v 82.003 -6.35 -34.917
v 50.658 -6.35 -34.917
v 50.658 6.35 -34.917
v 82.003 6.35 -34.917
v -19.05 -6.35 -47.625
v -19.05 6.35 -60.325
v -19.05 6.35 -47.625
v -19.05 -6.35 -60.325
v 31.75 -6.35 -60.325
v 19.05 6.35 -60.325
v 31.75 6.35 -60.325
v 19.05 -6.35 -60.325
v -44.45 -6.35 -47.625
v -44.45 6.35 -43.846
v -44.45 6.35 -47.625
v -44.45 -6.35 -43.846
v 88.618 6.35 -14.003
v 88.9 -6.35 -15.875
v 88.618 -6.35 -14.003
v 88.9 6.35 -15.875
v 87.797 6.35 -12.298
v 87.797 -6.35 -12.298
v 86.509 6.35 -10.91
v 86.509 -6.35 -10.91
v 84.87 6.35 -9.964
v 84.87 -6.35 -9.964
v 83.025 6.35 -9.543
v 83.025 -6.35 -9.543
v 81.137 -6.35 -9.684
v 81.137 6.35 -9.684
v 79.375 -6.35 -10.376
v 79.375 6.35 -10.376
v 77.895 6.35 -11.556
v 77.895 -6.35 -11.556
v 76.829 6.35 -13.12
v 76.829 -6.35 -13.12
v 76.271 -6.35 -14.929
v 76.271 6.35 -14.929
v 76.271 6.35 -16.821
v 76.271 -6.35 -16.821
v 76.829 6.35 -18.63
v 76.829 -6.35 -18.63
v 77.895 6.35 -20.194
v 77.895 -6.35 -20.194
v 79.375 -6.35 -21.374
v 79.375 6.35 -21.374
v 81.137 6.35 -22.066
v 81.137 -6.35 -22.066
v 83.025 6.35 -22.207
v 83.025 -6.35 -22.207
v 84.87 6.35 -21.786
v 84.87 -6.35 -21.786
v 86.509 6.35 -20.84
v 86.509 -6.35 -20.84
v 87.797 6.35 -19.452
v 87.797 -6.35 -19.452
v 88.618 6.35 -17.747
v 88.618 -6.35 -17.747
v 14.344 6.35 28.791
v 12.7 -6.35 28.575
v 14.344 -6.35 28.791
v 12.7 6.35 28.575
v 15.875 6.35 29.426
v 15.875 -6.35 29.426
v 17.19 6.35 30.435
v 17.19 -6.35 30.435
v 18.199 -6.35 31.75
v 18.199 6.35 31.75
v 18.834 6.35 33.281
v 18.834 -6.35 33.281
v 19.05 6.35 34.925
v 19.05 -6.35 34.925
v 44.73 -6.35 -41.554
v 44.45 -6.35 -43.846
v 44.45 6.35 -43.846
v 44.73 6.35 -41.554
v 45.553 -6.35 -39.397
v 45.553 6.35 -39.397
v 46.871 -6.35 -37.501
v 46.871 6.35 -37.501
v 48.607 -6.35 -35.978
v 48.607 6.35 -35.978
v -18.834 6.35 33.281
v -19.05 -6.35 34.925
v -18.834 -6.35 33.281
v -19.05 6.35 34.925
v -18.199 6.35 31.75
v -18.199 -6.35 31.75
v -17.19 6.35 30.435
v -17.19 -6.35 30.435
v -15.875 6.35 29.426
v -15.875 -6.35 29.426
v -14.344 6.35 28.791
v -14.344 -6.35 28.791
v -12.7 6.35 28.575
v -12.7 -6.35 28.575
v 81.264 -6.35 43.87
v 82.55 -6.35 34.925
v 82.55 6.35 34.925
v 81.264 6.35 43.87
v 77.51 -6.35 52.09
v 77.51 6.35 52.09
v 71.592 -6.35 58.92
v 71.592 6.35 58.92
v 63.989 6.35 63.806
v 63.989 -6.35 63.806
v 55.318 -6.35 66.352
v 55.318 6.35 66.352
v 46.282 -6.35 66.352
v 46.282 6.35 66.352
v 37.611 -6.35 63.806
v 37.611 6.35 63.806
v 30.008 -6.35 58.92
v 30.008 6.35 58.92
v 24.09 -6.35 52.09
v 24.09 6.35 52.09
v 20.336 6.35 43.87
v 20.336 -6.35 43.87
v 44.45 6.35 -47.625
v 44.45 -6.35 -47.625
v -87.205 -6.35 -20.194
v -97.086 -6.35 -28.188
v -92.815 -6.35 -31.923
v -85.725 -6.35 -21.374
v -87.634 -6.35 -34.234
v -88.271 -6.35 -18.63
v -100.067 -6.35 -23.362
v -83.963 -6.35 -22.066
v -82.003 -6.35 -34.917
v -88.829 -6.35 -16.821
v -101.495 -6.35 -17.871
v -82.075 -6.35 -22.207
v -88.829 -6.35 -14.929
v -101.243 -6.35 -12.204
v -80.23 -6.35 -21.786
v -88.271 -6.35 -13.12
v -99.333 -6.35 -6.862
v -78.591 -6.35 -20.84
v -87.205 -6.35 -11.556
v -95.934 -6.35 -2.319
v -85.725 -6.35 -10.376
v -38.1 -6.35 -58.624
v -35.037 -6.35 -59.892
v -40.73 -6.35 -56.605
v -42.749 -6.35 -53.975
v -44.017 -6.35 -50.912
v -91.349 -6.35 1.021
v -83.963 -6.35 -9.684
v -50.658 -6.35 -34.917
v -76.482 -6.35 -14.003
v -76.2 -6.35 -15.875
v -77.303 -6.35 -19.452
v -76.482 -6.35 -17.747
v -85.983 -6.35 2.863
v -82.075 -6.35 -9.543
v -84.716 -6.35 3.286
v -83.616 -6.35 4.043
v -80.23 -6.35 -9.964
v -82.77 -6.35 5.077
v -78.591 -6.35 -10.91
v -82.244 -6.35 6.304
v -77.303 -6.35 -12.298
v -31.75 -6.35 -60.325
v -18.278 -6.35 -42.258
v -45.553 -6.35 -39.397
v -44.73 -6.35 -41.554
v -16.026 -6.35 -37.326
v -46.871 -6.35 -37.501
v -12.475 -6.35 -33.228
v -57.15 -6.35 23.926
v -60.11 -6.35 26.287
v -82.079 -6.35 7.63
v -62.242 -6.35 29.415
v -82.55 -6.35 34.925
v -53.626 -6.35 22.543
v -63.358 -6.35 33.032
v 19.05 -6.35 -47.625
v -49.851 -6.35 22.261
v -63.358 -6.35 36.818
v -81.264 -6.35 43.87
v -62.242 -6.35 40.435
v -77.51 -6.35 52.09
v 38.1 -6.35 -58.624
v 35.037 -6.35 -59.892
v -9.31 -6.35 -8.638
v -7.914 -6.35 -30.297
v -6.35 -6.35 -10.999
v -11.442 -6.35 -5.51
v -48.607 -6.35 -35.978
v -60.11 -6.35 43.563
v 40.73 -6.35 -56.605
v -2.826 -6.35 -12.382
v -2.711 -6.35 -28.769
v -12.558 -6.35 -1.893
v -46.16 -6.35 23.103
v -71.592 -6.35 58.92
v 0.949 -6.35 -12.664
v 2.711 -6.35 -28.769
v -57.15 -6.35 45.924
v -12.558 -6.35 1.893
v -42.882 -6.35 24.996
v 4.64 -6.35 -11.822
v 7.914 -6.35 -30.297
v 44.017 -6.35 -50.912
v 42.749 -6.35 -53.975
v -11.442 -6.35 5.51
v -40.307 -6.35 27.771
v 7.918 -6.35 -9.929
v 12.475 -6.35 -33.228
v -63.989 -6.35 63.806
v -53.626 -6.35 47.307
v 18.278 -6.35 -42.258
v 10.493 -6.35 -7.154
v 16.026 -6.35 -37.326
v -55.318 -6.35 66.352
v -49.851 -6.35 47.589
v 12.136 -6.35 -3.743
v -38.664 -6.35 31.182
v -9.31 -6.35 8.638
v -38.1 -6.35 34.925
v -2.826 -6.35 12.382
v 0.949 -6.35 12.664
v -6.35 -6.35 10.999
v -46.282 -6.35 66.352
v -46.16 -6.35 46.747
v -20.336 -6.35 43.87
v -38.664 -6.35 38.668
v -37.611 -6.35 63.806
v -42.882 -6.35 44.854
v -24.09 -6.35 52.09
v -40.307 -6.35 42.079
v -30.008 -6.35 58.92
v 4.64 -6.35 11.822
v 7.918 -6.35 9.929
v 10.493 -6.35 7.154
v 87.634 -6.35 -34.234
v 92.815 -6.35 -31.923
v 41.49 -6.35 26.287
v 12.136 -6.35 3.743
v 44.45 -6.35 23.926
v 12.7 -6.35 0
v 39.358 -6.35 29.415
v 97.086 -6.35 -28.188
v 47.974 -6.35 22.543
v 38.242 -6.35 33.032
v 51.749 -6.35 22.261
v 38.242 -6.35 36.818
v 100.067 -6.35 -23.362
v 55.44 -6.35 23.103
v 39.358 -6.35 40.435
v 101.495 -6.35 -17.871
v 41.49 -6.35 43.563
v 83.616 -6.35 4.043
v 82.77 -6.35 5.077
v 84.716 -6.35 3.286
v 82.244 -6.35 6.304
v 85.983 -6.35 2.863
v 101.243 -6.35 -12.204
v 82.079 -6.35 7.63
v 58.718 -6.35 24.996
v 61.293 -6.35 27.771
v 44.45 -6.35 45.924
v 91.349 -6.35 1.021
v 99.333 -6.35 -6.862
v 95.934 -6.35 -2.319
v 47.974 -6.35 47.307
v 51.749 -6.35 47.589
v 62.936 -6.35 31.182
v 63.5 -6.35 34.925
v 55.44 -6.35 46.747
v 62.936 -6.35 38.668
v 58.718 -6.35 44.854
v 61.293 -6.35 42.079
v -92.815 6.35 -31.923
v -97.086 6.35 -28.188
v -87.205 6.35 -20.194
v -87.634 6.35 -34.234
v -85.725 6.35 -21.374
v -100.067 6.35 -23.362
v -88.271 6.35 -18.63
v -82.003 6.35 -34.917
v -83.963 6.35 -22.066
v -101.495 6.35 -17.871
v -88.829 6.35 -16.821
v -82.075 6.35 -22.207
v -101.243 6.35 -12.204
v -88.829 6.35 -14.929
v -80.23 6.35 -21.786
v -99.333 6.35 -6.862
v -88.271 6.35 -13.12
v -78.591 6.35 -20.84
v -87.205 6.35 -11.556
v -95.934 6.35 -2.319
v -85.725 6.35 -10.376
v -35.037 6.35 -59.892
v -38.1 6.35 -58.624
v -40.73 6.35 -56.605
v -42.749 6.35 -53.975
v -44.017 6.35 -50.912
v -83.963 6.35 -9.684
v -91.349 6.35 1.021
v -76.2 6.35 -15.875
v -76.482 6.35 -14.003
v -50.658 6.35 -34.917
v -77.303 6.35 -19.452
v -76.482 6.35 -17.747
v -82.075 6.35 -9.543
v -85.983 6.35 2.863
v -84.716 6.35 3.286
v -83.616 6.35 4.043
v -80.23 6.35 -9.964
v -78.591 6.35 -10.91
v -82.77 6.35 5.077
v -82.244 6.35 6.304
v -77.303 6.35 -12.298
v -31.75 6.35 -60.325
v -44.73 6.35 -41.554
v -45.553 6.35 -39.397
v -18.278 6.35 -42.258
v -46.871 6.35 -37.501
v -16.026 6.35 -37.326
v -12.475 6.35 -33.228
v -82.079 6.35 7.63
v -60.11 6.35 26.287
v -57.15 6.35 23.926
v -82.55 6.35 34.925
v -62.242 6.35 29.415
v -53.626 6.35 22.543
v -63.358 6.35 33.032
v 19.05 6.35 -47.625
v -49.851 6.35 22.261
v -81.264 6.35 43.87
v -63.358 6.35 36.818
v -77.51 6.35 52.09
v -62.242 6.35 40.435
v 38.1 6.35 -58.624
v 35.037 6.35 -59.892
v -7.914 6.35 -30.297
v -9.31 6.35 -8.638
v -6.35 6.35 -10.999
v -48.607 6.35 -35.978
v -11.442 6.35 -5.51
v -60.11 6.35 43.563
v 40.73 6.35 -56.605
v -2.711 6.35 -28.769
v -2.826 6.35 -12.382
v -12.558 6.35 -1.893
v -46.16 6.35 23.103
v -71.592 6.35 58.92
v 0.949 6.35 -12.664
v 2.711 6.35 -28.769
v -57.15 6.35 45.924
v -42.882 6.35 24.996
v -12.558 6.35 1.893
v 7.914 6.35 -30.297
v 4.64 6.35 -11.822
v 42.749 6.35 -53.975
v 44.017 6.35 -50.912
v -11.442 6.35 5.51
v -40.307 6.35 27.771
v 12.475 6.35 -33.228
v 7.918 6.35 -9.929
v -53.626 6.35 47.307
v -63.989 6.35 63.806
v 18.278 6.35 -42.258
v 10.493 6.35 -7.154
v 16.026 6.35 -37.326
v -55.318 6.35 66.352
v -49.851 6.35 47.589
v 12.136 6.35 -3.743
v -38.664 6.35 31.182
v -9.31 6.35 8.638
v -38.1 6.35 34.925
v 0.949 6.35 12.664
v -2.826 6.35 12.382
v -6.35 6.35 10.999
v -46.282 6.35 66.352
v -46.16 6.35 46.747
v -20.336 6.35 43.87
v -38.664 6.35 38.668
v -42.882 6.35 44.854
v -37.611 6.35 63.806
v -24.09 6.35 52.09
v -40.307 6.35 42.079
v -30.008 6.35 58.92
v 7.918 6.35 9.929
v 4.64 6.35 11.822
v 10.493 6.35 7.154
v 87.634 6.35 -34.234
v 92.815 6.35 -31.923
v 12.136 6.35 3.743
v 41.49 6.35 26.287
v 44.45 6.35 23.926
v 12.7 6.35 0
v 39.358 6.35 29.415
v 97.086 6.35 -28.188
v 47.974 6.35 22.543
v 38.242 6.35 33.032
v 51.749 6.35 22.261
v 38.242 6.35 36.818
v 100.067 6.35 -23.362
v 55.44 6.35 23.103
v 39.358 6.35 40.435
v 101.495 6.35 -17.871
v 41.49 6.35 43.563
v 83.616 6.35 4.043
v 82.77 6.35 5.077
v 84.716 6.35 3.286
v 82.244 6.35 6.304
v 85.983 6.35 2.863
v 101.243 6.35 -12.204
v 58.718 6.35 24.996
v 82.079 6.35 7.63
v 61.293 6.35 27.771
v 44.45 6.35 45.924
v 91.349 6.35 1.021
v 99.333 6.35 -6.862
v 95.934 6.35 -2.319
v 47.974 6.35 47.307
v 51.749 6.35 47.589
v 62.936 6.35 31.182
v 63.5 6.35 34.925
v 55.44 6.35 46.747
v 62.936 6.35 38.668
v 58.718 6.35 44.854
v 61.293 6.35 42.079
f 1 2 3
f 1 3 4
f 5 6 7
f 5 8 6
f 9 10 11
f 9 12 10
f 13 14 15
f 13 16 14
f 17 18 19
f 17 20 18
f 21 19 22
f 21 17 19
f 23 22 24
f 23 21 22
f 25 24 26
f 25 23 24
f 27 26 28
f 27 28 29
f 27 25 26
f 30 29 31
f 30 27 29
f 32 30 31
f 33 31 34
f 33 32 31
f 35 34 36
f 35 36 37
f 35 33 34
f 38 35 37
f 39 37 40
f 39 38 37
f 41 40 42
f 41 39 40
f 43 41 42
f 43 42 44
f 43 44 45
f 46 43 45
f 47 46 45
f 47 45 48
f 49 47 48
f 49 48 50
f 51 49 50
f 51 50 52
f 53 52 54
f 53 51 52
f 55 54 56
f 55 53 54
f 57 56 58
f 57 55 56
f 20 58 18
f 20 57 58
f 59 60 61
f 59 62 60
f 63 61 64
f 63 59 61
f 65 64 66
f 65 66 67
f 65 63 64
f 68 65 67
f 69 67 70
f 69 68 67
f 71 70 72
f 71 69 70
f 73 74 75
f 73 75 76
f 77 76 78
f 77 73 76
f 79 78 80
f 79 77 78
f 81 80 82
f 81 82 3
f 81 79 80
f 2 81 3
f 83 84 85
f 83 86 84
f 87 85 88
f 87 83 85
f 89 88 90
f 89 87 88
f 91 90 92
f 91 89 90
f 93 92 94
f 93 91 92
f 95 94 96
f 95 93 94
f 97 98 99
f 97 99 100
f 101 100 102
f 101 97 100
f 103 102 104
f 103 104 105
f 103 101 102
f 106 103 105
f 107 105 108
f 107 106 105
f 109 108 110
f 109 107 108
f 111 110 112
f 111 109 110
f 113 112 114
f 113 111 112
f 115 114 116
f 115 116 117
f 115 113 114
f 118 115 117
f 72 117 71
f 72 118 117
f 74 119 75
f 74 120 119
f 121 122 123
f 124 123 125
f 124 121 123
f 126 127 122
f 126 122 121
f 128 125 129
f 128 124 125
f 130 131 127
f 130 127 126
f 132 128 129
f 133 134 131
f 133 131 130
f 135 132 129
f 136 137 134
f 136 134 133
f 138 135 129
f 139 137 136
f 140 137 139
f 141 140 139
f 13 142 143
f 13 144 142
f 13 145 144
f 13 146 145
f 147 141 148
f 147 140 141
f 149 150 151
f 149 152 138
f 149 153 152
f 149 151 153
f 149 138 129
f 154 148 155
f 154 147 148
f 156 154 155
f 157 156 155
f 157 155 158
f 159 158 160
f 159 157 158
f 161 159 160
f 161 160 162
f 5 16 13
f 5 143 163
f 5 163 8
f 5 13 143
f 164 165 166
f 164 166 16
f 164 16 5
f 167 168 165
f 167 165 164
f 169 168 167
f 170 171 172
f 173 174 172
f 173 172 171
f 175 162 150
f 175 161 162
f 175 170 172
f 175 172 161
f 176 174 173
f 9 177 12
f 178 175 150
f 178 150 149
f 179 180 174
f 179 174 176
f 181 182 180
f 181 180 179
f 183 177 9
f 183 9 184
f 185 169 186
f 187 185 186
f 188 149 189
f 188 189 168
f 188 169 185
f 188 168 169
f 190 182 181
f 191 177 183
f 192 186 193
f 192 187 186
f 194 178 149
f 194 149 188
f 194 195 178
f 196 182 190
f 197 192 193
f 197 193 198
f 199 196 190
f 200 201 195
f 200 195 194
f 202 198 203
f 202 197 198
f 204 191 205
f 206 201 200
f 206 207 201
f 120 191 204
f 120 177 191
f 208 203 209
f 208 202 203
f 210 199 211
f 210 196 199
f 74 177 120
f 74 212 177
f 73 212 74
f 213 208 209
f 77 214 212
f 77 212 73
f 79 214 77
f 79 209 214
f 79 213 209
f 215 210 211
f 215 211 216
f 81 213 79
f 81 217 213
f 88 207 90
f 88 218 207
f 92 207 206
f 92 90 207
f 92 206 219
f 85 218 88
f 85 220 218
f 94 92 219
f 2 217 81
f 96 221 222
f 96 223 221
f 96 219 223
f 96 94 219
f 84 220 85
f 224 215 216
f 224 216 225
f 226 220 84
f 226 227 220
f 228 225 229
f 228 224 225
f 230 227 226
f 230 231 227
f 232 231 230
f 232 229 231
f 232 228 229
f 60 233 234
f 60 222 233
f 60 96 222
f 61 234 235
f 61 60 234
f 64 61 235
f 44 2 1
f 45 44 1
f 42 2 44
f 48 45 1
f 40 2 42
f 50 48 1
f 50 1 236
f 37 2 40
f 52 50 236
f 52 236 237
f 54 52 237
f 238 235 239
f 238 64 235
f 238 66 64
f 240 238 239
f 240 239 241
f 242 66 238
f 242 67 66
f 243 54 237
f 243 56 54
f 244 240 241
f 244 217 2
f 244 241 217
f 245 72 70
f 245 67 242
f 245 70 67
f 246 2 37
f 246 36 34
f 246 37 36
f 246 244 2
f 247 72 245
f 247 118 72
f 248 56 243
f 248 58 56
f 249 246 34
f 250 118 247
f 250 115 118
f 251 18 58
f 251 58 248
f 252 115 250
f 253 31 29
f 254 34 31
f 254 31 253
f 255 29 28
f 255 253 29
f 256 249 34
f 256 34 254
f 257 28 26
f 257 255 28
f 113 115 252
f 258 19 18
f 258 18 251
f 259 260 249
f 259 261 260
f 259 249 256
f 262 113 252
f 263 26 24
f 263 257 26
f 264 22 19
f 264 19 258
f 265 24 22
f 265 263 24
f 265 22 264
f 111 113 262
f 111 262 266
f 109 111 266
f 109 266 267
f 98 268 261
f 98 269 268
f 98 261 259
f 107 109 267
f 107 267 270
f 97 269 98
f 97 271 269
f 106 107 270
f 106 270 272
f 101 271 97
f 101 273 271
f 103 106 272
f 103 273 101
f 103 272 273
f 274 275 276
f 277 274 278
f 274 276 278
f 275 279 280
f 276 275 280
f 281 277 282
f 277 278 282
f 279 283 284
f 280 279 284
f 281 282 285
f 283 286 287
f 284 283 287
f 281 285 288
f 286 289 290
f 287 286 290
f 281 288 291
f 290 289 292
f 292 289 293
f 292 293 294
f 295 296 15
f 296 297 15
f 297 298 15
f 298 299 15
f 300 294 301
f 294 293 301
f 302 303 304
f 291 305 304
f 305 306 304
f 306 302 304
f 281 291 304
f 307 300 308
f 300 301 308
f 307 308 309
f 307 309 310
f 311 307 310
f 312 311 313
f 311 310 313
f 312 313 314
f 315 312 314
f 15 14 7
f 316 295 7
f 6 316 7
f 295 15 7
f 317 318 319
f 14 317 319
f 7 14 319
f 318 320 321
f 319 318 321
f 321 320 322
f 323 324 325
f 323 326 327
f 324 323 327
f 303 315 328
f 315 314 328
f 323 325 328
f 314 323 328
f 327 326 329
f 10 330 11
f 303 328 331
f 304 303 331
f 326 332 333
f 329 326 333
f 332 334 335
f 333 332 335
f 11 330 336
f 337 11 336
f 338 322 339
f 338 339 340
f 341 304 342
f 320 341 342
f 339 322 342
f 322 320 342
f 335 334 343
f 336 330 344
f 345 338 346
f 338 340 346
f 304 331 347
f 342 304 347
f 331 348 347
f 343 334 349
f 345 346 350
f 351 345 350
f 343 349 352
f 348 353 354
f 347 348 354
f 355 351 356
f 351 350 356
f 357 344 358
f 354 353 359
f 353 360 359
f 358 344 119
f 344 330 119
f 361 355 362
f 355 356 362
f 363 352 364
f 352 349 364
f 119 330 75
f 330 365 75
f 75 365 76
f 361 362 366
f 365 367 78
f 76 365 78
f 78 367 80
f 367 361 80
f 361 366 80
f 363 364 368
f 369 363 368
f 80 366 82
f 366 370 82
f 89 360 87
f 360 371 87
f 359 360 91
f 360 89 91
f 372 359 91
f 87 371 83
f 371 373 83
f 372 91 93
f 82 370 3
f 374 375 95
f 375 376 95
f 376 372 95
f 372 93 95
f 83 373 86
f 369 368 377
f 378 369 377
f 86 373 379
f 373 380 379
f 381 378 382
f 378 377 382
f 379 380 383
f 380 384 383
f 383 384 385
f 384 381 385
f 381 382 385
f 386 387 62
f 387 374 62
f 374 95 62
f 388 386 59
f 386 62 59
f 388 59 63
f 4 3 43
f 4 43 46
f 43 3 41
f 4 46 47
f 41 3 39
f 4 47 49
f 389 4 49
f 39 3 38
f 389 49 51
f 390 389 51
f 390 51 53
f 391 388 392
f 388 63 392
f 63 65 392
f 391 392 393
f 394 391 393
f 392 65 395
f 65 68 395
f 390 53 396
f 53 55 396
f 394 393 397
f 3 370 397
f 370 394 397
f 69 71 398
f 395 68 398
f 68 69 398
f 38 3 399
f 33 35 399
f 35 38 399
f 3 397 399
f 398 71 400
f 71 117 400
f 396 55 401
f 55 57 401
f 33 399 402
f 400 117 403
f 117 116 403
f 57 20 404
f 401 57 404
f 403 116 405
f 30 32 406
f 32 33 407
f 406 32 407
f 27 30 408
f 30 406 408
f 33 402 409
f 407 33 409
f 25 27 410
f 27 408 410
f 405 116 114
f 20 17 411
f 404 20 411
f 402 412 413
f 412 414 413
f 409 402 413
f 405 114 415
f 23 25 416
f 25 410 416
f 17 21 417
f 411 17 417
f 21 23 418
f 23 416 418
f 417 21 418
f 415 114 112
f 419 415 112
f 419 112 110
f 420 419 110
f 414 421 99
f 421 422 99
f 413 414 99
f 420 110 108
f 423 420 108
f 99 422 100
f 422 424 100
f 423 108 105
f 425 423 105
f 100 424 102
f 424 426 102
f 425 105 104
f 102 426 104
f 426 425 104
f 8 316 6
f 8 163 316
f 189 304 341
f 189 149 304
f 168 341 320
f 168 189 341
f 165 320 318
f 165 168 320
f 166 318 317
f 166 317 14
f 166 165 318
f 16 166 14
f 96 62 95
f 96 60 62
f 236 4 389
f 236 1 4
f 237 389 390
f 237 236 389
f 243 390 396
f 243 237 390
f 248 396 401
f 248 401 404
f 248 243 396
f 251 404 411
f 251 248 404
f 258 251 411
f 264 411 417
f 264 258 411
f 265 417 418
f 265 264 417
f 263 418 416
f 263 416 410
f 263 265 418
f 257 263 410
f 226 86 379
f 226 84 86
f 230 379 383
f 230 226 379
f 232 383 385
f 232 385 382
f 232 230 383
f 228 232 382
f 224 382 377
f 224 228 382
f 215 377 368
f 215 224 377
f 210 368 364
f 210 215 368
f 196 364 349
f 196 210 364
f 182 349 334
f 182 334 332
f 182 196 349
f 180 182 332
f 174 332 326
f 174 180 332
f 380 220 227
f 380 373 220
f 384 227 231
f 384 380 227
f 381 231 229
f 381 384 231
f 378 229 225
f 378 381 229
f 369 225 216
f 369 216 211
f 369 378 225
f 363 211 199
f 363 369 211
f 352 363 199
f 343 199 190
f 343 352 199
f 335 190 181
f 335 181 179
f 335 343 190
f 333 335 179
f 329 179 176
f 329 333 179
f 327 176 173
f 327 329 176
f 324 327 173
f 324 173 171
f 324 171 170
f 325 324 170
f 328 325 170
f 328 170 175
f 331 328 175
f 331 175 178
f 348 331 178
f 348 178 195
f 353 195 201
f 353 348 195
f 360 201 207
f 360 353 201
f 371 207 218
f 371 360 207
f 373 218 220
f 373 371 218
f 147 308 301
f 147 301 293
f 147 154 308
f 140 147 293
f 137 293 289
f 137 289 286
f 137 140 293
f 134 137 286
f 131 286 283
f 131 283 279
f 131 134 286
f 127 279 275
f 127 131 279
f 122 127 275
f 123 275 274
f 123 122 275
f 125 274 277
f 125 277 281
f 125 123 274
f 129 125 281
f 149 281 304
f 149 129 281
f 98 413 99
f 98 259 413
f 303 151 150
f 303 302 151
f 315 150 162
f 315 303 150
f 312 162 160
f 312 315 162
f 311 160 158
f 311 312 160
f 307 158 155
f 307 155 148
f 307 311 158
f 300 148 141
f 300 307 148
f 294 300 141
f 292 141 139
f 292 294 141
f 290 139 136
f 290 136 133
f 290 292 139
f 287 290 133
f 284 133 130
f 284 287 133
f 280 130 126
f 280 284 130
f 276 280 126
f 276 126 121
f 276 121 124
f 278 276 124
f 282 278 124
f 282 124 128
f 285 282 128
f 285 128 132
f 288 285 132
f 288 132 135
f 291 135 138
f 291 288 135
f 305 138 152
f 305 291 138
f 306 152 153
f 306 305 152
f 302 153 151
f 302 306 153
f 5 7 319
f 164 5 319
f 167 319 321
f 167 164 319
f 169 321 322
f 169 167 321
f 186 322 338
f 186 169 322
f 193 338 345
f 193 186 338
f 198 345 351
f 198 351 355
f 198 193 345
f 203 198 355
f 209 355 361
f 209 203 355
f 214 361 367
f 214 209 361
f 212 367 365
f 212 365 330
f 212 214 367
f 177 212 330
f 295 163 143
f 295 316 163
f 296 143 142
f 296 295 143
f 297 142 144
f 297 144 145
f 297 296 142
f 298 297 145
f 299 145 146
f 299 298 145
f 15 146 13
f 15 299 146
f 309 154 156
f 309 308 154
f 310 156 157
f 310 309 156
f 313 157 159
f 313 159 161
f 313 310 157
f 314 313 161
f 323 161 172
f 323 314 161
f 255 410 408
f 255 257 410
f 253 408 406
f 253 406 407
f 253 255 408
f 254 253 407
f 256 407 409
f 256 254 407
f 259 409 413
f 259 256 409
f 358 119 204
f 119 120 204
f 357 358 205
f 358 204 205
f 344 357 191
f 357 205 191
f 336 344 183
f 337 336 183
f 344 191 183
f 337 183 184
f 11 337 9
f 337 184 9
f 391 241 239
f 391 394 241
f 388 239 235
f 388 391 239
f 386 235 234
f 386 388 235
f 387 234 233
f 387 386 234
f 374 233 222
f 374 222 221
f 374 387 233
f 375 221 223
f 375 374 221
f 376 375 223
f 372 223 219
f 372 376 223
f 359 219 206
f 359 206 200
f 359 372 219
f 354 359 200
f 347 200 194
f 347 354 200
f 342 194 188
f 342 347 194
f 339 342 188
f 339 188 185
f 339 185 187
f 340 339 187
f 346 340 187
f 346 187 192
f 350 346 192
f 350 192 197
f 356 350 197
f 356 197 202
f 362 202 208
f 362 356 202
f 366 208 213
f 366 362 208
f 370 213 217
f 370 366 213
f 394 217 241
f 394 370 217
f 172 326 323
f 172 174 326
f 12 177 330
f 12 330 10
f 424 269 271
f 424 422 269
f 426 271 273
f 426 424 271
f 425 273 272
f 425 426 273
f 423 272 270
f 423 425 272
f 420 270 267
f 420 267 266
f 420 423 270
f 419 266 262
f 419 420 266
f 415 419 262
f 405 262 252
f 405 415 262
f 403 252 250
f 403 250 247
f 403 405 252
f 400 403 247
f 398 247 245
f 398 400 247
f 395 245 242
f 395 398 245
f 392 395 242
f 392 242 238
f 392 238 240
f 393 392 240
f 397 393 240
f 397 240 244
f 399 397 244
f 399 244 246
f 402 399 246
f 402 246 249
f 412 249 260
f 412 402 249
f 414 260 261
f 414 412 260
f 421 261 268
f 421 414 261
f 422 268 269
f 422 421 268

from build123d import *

# Parameters (mm, degrees)
F0_R     = 9.525
F0_R_2   = 12.7
F0_R_3   = 6.35
F1_DEPTH = 6.35
F2_R     = 12.7
F3_R     = 4.7625
F4_R     = 6.34999


# Not quite as in the source:
# - a fillet or chamfer is up to 0.001 mm smaller than in the source, because OpenCascade refuses the exact size


with BuildPart() as f1:
    # F0 (on Front) → F1 (new body, symmetric)
    with BuildSketch(Plane.XZ):
        with BuildLine():
            Line((-19.05, -60.325), (-19.05, -47.625))
            ThreePointArc((-19.05, -47.625), (0, -28.575), (19.05, -47.625))
            Line((19.05, -47.625), (19.05, -60.325))
            Line((19.05, -60.325), (44.45, -60.325))
            Line((44.45, -60.325), (44.45, -43.8458790377))
            ThreePointArc((44.45, -43.8458790377), (46.1544838519, -38.4084943559), (50.6579059691, -34.9171326425))
            Line((50.6579059691, -34.9171326425), (82.0025655956, -34.9171326425))
            ThreePointArc((82.0025655956, -34.9171326425), (101.6, -15.875), (82.0025655956, 3.1671326425))
            Line((82.0025655956, 3.1671326425), (82.55, 34.925))
            ThreePointArc((82.55, 34.925), (50.8, 66.675), (19.05, 34.925))
            Line((19.05, 34.925), (19.05, 28.575))
            Line((19.05, 28.575), (-19.05, 28.575))
            Line((-19.05, 28.575), (-19.05, 34.925))
            ThreePointArc((-19.05, 34.925), (-50.8, 66.675), (-82.55, 34.925))
            Line((-82.55, 34.925), (-82.0025655956, 3.1671326425))
            ThreePointArc((-82.0025655956, 3.1671326425), (-101.6, -15.875), (-82.0025655956, -34.9171326425))
            Line((-82.0025655956, -34.9171326425), (-50.6579059691, -34.9171326425))
            ThreePointArc((-50.6579059691, -34.9171326425), (-46.1544838519, -38.4084943559), (-44.45, -43.8458790377))
            Line((-44.45, -43.8458790377), (-44.45, -60.325))
            Line((-44.45, -60.325), (-19.05, -60.325))
        make_face()
        with Locations((-82.55, -15.875)):
            Circle(F0_R, mode=Mode.SUBTRACT)
        Circle(F0_R_2, mode=Mode.SUBTRACT)
        with Locations((82.55, -15.875)):
            Circle(F0_R, mode=Mode.SUBTRACT)
        with Locations((-50.8, 34.925)):
            Circle(F0_R_2, mode=Mode.SUBTRACT)
        with Locations((50.8, 34.925)):
            Circle(F0_R_2, mode=Mode.SUBTRACT)
        with Locations((82.55, -15.875)):
            Circle(F0_R)
        with Locations((82.55, -15.875)):
            Circle(F0_R_3, mode=Mode.SUBTRACT)
        with Locations((-82.55, -15.875)):
            Circle(F0_R)
        with Locations((-82.55, -15.875)):
            Circle(F0_R_3, mode=Mode.SUBTRACT)
    extrude(amount=F1_DEPTH, both=True)

    # F2
    f2_edges = [f1.edges().sort_by_distance(p)[0] for p in [
        (-44.45, 0, -60.325),
        (44.45, 0, -60.325),
    ]]
    fillet(f2_edges, radius=F2_R)

    # F3
    f3_edges = [f1.edges().sort_by_distance(p)[0] for p in [
        (-82.002566, 0, 3.167133),
        (82.002566, 0, 3.167133),
    ]]
    fillet(f3_edges, radius=F3_R)

    # F4 (radius 6.35 in the source; OpenCascade refuses exactly that, so slightly less here)
    f4_edges = [f1.edges().sort_by_distance(p)[0] for p in [
        (-19.05, 0, 28.575),
        (19.05, 0, 28.575),
    ]]
    fillet(f4_edges, radius=F4_R)


solid = f1.part
